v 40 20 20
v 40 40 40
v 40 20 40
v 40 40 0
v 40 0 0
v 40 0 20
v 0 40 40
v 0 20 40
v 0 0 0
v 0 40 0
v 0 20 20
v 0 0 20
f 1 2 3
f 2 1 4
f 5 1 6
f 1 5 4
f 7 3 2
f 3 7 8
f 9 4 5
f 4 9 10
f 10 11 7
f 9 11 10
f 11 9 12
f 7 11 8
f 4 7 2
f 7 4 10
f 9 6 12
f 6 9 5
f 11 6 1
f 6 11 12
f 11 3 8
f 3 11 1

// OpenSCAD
difference(){
cube([40,40,40]);
translate([0,0,20,])
cube([40,20,20]);
}
